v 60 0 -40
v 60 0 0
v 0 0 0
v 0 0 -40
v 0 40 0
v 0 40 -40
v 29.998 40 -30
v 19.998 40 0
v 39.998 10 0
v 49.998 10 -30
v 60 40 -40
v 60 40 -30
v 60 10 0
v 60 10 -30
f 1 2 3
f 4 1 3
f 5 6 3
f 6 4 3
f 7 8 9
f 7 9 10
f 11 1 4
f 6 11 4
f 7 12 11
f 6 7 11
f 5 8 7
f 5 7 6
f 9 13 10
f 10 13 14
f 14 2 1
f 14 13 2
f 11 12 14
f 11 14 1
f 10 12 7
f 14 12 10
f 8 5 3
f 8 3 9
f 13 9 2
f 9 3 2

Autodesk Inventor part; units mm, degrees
ref_plane "YZ Plane" through (0, 0, 0) normal (1, 0, 0) x (0, 1, 0)
ref_plane "XZ Plane" through (0, 0, 0) normal (0, 1, 0) x (-1, 0, 0)
sketch "草圖1" plane through (0, 0, 0) normal (0, 1, 0) x (-1, 0, 0)
  line L0 (0, 0) -> (-60, 0)
  line L1 (-60, 0) -> (-60, -40)
  line L2 (-60, -40) -> (0, -40)
  line L3 (0, -40) -> (0, 0)
  dimension "d0" = 60
  dimension "d1" = 40
extrude "擠出1" add sketch "草圖1" along normal blind 40
sketch "草圖2" plane through (60, 0, 0) normal (1, 0, 0) x (0, 0, -1)
  line L0 (0, 40) -> (30, 40)
  line L1 (30, 40) -> (30, 10)
  line L2 (30, 10) -> (0, 10)
  line L3 (0, 10) -> (0, 40)
  line L4 (40, 0) -> (40, 40) projected
  line L5 (0, 0) -> (40, 0) projected
  dimension "d4" = 10
  dimension "d5" = 10
extrude "擠出2" cut sketch "草圖2" against normal blind 10
sketch "草圖6" plane through (0, 40, 0) normal (0, 1, 0) x (1, 0, 0)
  line L0 (0, 0) -> (60, 0) projected
  line L1 (60, 30) -> (60, 0) projected
  line L2 (0, 40) -> (0, 0) projected
  line L3 (50, 30) -> (60, 30) projected
  point P0 (20, 0)
  point P1 (30, 30)
  dimension "d12" = 30
  dimension "d13" = 20
  dimension "d14" = 0
sketch "草圖7" plane through (0, 0, 0) normal (0, 0, 1) x (1, 0, 0)
  line L0 (60, 0) -> (60, 10) projected
  line L1 (60, 10) -> (50, 10) projected
  point P0 (0, 0)
  point P1 (40, 10)
  dimension "d15" = 20
  dimension "d16" = 0
ref_plane "工作平面2" through (20, 40, 0) normal (-0.8017837, -0.5345225, -0.2672612) x (0.3162278, 0, -0.9486833)
sketch "草圖8" plane through (20, 40, 0) normal (-0.8017837, -0.5345225, -0.2672612) x (0.3162278, 0, -0.9486833)
  line L0 (-6.3246, -10.1419) -> (9.4868, 15.2128) projected
  line L1 (-1.8957, -3.0399) -> (37.7838, -3.0399)
  line L2 (37.7838, -3.0399) -> (37.7838, 41.2626)
  line L3 (37.7838, 41.2626) -> (-1.8957, 41.2626)
  line L4 (-1.8957, 41.2626) -> (-1.8957, -3.0399)
  point P0 (-6.3246, 23.6643)
extrude "擠出3" cut sketch "草圖8" against normal blind 50
sketch "草圖9" plane through (0, 40, 0) normal (0, 1, 0) x (1, 0, 0)
  line L0 (60, 30) -> (50, 30) projected
  line L1 (60, 40) -> (0, 40) projected
  line L2 (60, 30) -> (0, 30)
  line L3 (0, 30) -> (0, 40)
  line L4 (0, 40) -> (60, 40)
  line L5 (60, 40) -> (60, 30)
  point P0 (0, 0)
extrude "擠出4" add sketch "草圖9" against normal up to next
sketch "草圖10" plane through (60, 0, -40) normal (1, 0, 0) x (0, 0, -1)
  line L0 (-10, 40) -> (0, 40) projected
  line L1 (0, 40) -> (-10, 40)
  line L2 (-10, 40) -> (-10, 0)
  line L3 (-10, 0) -> (0, 0)
  line L4 (0, 0) -> (0, 40)
  line L5 (-40, 0) -> (-40, 40) projected
  line L6 (0, 0) -> (-40, 0)
  line L7 (-40, 0) -> (-40, 10)
  line L8 (-40, 10) -> (0, 10)
  line L9 (0, 10) -> (0, 0)
  dimension "d21" = 0
  dimension "d22" = 10
  dimension "d23" = 10
extrude "擠出5" add sketch "草圖10" against normal up to next
delete faces "刪除面1" heal yes whole lump no faces at (50, 30, -29.8851) (49.8276, 20.2573, -29.8851)
properties part number "49 (73500.000 mm^3)"
